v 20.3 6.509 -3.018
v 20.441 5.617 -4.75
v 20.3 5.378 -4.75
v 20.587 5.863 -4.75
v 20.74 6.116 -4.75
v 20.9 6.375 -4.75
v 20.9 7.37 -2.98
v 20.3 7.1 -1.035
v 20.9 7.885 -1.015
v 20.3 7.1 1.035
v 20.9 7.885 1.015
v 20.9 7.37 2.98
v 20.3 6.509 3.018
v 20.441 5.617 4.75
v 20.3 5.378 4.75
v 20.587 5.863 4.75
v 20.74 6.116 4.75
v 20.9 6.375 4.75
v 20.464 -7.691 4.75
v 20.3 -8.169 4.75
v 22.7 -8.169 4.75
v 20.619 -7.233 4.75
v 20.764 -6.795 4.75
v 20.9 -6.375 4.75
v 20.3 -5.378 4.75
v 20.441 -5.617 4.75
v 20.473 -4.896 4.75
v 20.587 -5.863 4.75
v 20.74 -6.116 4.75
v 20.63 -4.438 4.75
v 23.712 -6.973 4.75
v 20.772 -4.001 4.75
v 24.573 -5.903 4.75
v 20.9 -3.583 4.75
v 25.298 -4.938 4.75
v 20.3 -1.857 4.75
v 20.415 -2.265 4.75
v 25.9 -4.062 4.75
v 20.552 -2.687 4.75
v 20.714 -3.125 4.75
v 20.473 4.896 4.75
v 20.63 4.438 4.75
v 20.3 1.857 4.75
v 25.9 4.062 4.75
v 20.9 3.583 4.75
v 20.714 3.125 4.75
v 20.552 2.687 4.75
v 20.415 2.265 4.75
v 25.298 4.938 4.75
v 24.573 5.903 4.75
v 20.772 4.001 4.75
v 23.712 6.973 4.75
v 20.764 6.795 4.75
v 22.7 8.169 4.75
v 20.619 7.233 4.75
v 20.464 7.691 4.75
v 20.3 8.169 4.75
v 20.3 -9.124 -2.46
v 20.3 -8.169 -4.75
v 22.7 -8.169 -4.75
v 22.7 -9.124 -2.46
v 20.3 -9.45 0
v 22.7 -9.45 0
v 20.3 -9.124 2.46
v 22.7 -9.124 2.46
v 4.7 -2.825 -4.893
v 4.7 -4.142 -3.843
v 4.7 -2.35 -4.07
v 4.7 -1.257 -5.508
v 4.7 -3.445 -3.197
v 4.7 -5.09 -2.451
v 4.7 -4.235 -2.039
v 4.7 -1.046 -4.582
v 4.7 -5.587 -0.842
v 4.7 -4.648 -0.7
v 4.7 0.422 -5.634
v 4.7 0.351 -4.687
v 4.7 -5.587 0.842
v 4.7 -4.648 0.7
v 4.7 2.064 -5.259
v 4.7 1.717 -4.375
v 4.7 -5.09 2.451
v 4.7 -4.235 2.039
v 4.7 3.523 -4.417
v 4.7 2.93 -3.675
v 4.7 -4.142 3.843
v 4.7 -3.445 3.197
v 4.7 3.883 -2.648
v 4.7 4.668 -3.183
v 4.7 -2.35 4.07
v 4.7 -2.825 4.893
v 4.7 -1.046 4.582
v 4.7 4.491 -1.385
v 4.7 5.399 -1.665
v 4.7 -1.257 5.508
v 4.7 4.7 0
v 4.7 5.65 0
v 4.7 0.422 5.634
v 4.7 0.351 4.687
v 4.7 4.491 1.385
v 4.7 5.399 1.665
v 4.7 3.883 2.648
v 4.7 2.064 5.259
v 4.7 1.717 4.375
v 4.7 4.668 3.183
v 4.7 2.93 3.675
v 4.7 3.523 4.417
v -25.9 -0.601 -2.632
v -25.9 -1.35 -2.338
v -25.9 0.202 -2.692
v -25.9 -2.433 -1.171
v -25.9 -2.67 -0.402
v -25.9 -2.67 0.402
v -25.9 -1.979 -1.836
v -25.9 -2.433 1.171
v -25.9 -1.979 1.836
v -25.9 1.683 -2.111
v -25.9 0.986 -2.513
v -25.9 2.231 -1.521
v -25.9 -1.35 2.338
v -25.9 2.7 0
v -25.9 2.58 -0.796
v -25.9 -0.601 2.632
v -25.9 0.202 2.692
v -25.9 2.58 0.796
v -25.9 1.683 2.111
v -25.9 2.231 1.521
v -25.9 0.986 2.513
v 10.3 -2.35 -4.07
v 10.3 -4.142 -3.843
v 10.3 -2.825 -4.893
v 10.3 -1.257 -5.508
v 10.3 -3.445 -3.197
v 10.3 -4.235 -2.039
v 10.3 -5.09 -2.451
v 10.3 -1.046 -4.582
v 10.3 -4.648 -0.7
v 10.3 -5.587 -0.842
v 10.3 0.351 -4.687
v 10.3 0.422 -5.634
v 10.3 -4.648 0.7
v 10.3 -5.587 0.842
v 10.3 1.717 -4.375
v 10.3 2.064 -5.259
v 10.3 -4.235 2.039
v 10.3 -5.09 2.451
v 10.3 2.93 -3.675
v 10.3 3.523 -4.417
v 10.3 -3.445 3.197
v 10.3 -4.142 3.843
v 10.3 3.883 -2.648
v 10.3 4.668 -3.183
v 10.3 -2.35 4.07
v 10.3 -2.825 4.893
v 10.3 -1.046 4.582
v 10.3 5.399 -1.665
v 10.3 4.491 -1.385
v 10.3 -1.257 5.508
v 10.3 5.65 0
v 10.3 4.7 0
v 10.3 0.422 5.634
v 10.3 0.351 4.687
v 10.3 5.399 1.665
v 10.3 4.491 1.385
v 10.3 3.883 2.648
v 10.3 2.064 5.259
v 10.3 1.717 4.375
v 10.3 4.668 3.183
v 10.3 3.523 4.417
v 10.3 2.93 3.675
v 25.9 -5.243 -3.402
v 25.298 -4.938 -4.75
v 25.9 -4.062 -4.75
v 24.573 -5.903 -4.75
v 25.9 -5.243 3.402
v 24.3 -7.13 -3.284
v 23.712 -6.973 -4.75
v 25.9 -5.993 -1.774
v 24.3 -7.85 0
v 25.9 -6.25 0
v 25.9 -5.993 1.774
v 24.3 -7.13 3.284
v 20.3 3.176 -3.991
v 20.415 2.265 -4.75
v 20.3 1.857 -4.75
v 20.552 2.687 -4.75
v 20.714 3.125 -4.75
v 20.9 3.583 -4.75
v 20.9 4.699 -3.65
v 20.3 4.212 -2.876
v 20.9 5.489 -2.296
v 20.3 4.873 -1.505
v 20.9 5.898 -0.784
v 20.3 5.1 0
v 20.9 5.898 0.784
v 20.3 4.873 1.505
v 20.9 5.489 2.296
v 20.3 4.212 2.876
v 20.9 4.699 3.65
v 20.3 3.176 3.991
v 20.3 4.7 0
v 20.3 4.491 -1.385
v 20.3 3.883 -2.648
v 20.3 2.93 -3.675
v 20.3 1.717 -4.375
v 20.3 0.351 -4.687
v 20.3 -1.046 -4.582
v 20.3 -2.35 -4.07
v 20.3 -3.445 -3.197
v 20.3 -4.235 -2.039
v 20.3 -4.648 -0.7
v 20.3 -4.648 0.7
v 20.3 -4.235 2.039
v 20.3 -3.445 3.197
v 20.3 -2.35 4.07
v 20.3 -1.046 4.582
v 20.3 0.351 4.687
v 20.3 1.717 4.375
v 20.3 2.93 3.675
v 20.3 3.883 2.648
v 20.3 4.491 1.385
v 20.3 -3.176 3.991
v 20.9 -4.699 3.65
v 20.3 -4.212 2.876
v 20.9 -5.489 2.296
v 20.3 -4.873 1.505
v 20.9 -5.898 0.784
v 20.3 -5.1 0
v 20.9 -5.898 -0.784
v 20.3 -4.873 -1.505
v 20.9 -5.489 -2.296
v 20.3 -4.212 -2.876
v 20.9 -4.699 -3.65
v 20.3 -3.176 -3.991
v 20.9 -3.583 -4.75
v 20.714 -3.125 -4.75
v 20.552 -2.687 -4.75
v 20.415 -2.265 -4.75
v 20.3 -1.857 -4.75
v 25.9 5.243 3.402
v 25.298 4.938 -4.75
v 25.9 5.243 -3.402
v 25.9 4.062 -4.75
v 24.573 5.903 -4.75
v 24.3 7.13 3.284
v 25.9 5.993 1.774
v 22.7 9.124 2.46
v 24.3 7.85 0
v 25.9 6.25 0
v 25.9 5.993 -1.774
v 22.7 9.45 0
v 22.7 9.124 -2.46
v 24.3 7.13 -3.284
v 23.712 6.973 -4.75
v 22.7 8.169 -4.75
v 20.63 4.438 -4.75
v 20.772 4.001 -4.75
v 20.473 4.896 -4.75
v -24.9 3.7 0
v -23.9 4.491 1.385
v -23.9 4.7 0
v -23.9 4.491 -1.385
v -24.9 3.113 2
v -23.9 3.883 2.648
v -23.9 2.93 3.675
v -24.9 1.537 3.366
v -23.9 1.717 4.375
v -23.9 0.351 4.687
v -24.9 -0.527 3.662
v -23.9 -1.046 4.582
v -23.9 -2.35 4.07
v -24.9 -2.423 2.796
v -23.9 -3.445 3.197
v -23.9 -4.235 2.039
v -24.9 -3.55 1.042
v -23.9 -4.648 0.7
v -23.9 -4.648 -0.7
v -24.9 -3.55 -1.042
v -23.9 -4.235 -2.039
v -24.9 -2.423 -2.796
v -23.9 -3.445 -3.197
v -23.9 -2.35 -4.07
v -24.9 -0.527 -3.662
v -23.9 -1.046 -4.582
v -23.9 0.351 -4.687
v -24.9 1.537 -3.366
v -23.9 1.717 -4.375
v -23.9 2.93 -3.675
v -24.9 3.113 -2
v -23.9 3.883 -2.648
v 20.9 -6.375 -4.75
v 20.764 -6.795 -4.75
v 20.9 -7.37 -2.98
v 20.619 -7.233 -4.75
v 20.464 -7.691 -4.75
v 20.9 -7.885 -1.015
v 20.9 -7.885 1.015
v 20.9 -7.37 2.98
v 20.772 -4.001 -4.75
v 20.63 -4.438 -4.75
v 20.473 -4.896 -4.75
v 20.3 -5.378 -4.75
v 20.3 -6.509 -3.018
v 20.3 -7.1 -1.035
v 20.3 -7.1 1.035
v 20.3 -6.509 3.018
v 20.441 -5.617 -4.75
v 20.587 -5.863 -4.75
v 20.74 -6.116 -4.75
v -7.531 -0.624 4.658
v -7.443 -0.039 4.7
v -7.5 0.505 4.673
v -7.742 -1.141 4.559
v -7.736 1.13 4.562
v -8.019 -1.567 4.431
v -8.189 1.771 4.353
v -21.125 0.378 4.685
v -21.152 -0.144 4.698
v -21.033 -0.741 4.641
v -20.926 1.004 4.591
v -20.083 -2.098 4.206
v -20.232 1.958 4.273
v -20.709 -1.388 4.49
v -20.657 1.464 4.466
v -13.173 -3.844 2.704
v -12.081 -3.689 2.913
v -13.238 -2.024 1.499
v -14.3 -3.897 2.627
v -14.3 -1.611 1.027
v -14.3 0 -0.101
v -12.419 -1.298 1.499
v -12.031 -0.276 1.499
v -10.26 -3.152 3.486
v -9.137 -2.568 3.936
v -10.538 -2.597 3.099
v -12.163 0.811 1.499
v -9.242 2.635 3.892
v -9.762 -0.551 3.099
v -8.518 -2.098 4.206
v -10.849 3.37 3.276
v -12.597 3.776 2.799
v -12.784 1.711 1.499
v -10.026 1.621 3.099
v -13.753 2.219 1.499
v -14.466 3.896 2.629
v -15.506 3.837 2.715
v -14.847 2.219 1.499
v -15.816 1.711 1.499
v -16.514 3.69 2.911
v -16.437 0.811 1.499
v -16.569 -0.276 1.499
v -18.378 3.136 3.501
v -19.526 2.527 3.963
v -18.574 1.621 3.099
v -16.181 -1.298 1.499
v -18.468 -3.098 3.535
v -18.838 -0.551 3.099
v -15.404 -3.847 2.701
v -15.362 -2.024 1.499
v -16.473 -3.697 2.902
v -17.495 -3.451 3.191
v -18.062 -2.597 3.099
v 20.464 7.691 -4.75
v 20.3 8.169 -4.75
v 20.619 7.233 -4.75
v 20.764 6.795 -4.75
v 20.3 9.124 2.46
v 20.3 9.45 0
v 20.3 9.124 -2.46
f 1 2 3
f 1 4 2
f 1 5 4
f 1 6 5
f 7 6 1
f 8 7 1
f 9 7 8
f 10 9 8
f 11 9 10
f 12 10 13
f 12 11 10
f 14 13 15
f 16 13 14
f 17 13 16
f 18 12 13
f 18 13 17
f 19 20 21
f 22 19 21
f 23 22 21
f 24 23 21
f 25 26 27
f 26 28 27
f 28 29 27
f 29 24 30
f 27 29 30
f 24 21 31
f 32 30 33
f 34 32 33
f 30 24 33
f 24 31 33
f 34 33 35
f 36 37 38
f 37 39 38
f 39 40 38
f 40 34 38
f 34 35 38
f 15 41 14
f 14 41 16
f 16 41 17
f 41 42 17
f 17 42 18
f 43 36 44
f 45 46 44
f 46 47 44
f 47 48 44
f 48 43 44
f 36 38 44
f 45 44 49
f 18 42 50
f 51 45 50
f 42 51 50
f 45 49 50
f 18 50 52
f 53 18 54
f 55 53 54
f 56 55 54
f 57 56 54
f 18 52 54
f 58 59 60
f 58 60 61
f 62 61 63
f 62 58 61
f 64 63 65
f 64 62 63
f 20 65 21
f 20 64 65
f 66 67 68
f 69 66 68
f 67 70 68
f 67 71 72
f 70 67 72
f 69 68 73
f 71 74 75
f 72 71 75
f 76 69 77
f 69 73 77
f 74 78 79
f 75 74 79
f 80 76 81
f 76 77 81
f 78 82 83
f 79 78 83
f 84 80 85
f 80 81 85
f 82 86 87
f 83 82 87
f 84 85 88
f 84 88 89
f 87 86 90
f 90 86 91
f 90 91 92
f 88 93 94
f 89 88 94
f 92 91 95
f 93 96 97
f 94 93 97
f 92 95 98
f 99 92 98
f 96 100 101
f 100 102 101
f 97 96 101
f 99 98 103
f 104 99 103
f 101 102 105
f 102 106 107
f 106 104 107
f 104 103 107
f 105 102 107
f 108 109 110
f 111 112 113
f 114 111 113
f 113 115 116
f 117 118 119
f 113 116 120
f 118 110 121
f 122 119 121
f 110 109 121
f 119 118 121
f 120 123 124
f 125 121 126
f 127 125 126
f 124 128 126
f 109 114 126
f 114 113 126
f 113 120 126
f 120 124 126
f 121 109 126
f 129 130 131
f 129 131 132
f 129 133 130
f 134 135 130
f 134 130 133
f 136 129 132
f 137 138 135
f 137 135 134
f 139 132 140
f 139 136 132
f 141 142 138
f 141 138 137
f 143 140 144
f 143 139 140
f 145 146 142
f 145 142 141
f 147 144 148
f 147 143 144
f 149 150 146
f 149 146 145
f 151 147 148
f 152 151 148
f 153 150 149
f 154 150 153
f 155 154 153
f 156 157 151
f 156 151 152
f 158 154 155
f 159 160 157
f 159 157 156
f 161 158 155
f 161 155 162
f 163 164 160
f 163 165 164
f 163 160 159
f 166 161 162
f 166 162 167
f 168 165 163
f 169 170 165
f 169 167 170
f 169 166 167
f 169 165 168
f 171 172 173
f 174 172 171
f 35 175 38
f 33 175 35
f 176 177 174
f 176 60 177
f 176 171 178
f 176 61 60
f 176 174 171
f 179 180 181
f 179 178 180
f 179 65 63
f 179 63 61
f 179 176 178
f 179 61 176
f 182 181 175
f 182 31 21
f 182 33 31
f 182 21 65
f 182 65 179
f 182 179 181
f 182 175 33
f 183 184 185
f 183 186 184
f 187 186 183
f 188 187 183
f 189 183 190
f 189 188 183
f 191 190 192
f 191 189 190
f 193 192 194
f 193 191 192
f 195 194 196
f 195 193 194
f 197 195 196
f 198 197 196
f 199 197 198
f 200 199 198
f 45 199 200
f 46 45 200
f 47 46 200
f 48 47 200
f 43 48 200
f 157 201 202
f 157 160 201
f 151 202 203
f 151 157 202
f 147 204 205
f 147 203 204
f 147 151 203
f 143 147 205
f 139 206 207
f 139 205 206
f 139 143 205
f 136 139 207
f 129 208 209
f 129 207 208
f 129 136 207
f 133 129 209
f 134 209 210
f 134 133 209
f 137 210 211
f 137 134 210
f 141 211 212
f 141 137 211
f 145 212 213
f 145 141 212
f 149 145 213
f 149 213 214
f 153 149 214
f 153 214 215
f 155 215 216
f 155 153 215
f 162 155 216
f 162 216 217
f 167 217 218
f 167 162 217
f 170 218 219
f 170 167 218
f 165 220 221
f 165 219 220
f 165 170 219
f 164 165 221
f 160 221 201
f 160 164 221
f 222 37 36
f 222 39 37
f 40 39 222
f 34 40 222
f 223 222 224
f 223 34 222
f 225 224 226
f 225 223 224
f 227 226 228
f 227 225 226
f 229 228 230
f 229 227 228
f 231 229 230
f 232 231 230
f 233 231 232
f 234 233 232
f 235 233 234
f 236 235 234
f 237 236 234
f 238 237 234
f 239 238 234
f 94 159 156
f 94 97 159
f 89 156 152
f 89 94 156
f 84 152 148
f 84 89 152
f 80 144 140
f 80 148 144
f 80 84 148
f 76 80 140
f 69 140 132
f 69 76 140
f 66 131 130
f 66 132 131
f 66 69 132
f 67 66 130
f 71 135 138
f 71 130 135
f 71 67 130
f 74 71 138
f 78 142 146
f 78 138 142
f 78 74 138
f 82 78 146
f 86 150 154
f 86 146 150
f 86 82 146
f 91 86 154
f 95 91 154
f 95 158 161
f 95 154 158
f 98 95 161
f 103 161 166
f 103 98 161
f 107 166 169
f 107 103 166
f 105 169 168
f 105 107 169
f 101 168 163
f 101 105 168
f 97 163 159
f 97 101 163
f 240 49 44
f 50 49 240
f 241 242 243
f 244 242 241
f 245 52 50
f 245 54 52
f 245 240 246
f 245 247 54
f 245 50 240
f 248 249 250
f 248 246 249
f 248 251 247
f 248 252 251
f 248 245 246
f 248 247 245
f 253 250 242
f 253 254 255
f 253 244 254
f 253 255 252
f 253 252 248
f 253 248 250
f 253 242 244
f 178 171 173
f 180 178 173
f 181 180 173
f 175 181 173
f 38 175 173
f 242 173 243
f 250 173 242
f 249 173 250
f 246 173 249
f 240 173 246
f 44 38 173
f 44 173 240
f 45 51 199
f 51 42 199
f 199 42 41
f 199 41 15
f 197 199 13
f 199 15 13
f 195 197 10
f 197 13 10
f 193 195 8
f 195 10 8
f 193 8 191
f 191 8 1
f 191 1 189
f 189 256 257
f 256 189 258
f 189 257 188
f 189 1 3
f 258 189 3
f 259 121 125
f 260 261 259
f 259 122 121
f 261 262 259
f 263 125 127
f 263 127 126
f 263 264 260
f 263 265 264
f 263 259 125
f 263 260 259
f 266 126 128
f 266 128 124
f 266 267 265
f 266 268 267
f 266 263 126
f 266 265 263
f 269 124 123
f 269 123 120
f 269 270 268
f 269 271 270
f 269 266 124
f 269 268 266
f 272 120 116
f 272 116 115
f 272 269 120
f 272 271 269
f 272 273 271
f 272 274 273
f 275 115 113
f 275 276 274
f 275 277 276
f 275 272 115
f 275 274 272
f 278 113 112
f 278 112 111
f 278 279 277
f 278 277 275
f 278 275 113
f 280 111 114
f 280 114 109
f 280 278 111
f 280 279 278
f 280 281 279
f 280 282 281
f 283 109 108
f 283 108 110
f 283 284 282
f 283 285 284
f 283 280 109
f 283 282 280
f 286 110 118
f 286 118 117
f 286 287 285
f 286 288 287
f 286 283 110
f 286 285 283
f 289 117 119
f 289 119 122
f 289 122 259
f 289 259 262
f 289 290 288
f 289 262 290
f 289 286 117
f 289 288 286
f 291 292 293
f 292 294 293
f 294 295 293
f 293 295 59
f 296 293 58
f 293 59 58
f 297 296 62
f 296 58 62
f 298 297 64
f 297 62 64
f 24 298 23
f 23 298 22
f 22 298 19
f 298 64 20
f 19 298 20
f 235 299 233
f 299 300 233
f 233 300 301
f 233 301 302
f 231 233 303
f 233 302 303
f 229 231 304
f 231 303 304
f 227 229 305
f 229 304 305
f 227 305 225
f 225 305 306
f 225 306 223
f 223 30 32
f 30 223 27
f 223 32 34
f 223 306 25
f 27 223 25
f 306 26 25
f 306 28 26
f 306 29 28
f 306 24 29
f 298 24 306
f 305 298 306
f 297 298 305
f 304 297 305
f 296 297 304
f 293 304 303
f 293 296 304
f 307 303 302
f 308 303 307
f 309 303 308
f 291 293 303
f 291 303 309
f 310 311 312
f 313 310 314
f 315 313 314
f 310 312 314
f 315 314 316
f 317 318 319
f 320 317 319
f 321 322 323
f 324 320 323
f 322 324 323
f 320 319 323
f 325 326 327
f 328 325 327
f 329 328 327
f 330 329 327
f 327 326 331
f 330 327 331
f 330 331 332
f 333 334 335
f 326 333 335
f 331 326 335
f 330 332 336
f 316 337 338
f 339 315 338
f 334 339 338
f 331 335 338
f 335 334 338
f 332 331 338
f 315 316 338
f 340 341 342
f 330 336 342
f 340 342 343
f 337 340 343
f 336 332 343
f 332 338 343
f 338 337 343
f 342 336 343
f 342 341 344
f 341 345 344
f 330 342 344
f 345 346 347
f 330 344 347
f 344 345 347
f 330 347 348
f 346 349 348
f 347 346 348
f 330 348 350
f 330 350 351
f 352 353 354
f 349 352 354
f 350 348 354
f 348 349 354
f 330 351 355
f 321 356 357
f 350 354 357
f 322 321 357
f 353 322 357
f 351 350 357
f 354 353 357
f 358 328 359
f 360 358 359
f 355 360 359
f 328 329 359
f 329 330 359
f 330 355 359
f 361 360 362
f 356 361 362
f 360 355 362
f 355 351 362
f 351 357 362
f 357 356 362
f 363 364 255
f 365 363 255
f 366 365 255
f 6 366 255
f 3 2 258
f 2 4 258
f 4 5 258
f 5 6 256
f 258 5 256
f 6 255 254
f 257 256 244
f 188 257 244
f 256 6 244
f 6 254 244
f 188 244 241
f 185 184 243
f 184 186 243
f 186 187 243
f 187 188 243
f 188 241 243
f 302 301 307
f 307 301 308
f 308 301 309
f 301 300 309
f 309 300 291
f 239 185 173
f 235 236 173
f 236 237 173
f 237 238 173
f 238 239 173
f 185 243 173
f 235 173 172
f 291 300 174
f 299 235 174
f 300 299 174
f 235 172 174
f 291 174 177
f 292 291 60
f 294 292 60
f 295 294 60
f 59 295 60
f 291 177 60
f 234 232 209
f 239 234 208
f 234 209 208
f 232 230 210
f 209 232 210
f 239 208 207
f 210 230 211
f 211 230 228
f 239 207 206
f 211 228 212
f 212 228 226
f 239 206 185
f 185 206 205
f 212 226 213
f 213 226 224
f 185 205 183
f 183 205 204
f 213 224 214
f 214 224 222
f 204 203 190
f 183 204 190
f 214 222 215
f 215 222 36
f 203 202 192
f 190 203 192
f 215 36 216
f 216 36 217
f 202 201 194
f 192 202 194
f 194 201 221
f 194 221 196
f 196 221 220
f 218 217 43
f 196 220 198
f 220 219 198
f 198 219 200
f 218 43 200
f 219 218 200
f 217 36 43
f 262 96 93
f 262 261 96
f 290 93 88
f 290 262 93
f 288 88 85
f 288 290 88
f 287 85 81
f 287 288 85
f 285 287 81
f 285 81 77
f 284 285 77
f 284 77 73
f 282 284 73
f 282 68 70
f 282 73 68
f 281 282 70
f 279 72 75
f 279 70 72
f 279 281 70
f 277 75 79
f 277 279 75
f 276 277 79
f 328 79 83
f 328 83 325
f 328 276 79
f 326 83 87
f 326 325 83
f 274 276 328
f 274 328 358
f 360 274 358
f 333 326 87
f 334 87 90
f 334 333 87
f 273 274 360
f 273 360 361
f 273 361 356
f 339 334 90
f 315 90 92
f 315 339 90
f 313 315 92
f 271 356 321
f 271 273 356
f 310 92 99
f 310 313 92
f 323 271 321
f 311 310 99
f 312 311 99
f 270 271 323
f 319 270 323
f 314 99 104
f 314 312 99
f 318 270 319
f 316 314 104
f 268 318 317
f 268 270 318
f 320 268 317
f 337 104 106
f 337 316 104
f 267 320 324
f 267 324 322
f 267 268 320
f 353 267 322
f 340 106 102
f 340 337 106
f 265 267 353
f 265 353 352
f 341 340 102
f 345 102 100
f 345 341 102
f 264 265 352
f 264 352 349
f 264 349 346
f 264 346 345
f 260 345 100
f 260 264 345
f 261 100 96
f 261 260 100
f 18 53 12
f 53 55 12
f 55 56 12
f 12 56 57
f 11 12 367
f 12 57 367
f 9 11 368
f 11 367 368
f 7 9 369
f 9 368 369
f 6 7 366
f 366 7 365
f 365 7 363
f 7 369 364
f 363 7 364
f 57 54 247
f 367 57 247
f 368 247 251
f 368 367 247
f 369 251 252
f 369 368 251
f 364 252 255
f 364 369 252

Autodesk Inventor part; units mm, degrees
ref_plane "YZ Plane" through (0, 0, 0) normal (1, 0, 0) x (0, 1, 0)
sketch "Sketch1" plane through (0, 0, 0) normal (0, 0, 1) x (1, 0, 0)
  line L0 (25.9, 0) -> (25.9, 6.25)
  line L1 (22.7, 9.45) -> (20.3, 9.45)
  line L2 (20.3, 9.45) -> (20.3, 7.175) construction
  line L3 (20.3, 4.7) -> (10.3, 4.7)
  line L4 (10.3, 4.7) -> (10.3, 5.65)
  line L5 (10.3, 5.65) -> (4.7, 5.65)
  line L6 (4.7, 5.65) -> (4.7, 4.7)
  line L7 (4.7, 4.7) -> (-23.9, 4.7)
  line L8 (-25.9, 2.7) -> (-25.9, 0)
  line L9 (-25.9, 0) -> (25.9, 0)
  line L10 (-23.9, 4.7) -> (-25.9, 2.7)
  line L11 (25.9, 6.25) -> (22.7, 9.45)
  line L12 (20.3, 9.45) -> (20.9, 7.95)
  line L13 (20.9, 7.95) -> (20.3, 7.175)
  line L14 (20.3, 7.175) -> (20.9, 5.95)
  line L15 (20.9, 5.95) -> (20.3, 5.1)
  line L16 (20.3, 7.175) -> (20.3, 5.1) construction
  line L17 (20.3, 5.1) -> (20.3, 4.7)
  point P0 (0, 0)
  point P1 (25.9, 9.45)
  point P2 (-25.9, 4.7)
  point P3 (0, 0)
  dimension "d0" = 9.45
  dimension "d1" = 5.6
  dimension "d2" = 51.8
  dimension "d3" = 4.7
  dimension "d4" = 10
  dimension "d5" = 5.6
  dimension "d6" = 5.65
  dimension "d7" = 2
  dimension "d8" = 2
  dimension "d10" = 3.2
  dimension "d11" = 3.2
  dimension "d26" = 0.6
  dimension "d27" = 1.5
  dimension "d28" = 2
  dimension "d29" = 0.4
  dimension "d30" = 2.275
revolve "Revolution1" add sketch "Sketch1" angle 360 about axis through (-25.9, 0, 0) along (1, 0, 0)
sketch "Sketch2" plane through (25.9, 0, 0) normal (1, 0, 0) x (0, 0, -1)
  line L0 (-4.75, 9.5) -> (4.75, 9.5) construction
  line L1 (4.75, 9.5) -> (4.75, -9.5)
  line L2 (4.75, -9.5) -> (-4.75, -9.5) construction
  line L3 (-4.75, -9.5) -> (-4.75, 9.5)
  line L4 (4.75, 9.5) -> (9.75, 9.5)
  line L5 (9.75, 9.5) -> (9.75, -9.5)
  line L6 (9.75, -9.5) -> (4.75, -9.5)
  line L7 (-4.75, 9.5) -> (-9.75, 9.5)
  line L8 (-9.75, 9.5) -> (-9.75, -9.5)
  line L9 (-9.75, -9.5) -> (-4.75, -9.5)
  point P0 (0, 0)
  point P1 (0, 9.5)
  point P2 (-4.75, 0)
  dimension "d12" = 9.5
  dimension "d13" = 19
  dimension "d14" = 5
extrude "Extrusion1" cut sketch "Sketch2" against normal blind 5.8
ref_plane "Work Plane1" through (0, 4.9, 0) normal (0, 1, 0) x (-1, 0, 0)
sketch "Sketch3" plane through (0, 4.9, 0) normal (0, 1, 0) x (-1, 0, 0)
  line L0 (-4.7, 5.65) -> (-4.7, -5.65) projected
  point P0 (0, 0)
  point P1 (14.3, 0)
  dimension "d18" = 19
hole "0°" [suppressed]
ref_plane "Work Plane2" through (0, 0, 5) normal (0, 0, 1) x (1, 0, 0)
sketch "Sketch4" plane through (0, 0, 5) normal (0, 0, 1) x (1, 0, 0)
  line L0 (4.7, -5.65) -> (4.7, 5.65) projected
  point P0 (0, 0)
  point P1 (-14.3, 0)
  dimension "d32" = 19
hole "90°" at (-14.3, 0, 5) direction (0, 0, -1) diameter 14 depth 0.2 tip angle 110
equation "\"d8\" = d7"
equation "\"d11\" = d10"
properties part number "Tornillo en T esquinero"
